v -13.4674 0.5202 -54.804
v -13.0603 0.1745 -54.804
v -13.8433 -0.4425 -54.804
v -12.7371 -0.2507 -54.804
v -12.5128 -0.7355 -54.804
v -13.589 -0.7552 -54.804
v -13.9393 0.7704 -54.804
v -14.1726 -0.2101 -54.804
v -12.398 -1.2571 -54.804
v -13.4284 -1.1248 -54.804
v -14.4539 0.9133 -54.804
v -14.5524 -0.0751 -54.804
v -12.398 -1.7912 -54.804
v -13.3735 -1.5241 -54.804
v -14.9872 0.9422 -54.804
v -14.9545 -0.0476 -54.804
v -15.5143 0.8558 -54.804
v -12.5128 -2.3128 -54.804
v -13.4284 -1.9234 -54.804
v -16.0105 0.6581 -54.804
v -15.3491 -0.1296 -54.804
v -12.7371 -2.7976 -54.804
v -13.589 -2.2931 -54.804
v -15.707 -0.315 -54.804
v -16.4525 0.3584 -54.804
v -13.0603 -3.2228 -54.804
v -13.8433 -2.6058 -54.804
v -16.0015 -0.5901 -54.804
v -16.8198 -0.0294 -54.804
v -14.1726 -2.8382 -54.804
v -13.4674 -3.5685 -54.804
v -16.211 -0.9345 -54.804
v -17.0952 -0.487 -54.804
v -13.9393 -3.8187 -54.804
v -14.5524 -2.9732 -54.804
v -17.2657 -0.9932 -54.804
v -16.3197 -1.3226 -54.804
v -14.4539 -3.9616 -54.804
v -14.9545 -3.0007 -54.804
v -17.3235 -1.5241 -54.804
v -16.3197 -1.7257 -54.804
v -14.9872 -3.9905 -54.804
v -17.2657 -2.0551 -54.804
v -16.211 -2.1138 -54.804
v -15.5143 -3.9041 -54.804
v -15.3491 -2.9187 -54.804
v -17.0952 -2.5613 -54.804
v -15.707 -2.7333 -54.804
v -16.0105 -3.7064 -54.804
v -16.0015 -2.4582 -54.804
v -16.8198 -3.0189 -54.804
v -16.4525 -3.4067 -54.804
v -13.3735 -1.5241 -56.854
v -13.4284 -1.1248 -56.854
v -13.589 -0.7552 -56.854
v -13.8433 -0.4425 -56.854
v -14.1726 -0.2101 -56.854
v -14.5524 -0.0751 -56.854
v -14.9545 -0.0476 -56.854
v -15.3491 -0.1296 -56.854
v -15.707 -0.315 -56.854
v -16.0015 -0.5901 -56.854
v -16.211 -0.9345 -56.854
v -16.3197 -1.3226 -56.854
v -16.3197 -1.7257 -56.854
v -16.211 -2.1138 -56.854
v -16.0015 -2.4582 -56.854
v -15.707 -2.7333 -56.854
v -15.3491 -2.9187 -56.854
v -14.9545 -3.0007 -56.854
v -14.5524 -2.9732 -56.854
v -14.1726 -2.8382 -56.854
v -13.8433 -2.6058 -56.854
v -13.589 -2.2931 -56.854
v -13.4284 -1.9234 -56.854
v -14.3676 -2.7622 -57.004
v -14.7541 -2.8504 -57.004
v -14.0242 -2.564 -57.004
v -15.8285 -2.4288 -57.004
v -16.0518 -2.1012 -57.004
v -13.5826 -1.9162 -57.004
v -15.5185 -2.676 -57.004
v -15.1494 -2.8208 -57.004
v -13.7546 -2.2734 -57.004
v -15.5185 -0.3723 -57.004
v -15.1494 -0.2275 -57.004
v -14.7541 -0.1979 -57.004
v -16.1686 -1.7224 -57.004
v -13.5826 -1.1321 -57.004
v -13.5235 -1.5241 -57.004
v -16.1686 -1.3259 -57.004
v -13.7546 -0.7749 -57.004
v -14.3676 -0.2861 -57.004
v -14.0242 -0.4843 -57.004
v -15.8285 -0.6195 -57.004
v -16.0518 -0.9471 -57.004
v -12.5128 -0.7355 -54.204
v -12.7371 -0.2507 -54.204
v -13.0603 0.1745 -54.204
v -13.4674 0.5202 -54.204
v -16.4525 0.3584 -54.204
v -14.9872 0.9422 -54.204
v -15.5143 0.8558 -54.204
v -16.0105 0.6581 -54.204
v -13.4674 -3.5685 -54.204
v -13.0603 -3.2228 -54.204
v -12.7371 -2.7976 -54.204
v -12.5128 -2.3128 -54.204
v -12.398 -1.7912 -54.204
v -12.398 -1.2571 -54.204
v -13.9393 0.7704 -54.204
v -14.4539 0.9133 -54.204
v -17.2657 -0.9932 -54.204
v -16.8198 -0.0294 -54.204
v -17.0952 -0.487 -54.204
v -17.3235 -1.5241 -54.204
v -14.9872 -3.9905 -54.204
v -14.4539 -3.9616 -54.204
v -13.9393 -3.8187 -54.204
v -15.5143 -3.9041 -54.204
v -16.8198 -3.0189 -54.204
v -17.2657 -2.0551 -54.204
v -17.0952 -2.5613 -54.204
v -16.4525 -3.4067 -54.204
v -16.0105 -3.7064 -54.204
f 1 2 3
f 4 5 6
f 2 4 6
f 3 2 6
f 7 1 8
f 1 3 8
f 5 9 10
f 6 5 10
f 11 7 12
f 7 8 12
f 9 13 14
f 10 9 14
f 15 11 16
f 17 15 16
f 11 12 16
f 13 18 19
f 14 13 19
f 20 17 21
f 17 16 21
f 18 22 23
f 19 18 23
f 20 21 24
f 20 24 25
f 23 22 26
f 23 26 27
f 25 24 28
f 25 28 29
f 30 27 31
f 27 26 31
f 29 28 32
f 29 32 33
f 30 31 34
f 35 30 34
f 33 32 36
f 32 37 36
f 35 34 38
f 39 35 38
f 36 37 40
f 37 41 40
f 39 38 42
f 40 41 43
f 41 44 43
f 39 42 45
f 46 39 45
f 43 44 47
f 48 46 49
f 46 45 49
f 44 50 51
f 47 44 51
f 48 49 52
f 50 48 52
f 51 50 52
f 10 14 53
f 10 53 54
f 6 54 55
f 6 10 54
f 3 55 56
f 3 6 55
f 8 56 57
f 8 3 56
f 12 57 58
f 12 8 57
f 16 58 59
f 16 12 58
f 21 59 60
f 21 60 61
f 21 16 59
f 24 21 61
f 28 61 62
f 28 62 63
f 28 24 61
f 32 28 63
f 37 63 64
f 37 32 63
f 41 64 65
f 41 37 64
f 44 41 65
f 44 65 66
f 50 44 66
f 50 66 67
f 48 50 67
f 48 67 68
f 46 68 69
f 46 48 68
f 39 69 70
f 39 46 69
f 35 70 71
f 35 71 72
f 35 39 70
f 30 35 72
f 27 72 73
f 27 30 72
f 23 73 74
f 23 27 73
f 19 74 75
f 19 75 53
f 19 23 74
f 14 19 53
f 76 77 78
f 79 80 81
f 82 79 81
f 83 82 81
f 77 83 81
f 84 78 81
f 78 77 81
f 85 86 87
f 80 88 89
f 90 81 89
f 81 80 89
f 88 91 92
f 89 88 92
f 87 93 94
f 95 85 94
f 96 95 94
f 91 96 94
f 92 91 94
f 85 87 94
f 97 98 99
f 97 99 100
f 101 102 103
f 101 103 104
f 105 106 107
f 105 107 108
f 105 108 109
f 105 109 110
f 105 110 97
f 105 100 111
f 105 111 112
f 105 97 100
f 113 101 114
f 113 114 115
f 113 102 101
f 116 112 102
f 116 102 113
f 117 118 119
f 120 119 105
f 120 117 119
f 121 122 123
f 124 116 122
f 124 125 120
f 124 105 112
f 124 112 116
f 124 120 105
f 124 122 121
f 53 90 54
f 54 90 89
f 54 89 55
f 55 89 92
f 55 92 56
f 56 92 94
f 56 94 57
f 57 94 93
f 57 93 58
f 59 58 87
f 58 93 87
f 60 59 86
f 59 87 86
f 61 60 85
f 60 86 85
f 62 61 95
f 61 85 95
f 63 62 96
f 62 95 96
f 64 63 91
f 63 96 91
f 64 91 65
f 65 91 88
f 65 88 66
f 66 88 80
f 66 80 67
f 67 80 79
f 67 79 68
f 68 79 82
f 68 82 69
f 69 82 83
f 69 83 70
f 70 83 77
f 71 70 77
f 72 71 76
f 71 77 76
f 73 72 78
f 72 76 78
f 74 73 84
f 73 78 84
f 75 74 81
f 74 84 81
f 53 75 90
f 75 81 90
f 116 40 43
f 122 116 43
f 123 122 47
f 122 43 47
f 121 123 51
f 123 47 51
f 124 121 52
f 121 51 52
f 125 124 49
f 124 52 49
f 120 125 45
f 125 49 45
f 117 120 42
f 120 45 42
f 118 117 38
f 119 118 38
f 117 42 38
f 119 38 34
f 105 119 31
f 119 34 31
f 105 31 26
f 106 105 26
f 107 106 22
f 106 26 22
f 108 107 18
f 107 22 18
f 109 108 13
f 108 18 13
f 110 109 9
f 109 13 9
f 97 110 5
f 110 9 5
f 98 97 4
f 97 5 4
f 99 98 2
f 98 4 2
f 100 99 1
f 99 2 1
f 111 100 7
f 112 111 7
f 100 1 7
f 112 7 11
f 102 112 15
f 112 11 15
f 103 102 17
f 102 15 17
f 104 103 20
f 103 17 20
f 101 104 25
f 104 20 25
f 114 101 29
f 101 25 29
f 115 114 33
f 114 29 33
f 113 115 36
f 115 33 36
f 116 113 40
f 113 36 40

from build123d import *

# Parameters (mm, degrees)
SKETCH_1_R      = 2.47
EXTRUDE_1_DEPTH = 0.6
SKETCH_2_R      = 1.48
EXTRUDE_2_DEPTH = 2.2
CHAMFER_1_SIZE  = 0.15


with BuildPart() as part:
    # 草图1 → 凸台-拉伸1 (new body)
    with BuildSketch(Plane.XY.offset(-54.8040151)):
        with Locations(Location((-14.853491423, -1.524148547, 0), (0, 0, 180))):
            Circle(SKETCH_1_R)
    extrude(amount=EXTRUDE_1_DEPTH)

    # 草图2 → 凸台-拉伸2 (add)
    with BuildSketch(Plane.XY.offset(-54.8040151)):
        with Locations((-14.853491423, -1.524148547)):
            Circle(SKETCH_2_R)
    extrude(amount=-EXTRUDE_2_DEPTH)

    # 倒角1
    chamfer_1_edges = [part.edges().sort_by_distance(p)[0] for p in [
        (-16.333491423, -1.524148547, -57.0040151),
    ]]
    chamfer(chamfer_1_edges, length=CHAMFER_1_SIZE)


solid = part.part
